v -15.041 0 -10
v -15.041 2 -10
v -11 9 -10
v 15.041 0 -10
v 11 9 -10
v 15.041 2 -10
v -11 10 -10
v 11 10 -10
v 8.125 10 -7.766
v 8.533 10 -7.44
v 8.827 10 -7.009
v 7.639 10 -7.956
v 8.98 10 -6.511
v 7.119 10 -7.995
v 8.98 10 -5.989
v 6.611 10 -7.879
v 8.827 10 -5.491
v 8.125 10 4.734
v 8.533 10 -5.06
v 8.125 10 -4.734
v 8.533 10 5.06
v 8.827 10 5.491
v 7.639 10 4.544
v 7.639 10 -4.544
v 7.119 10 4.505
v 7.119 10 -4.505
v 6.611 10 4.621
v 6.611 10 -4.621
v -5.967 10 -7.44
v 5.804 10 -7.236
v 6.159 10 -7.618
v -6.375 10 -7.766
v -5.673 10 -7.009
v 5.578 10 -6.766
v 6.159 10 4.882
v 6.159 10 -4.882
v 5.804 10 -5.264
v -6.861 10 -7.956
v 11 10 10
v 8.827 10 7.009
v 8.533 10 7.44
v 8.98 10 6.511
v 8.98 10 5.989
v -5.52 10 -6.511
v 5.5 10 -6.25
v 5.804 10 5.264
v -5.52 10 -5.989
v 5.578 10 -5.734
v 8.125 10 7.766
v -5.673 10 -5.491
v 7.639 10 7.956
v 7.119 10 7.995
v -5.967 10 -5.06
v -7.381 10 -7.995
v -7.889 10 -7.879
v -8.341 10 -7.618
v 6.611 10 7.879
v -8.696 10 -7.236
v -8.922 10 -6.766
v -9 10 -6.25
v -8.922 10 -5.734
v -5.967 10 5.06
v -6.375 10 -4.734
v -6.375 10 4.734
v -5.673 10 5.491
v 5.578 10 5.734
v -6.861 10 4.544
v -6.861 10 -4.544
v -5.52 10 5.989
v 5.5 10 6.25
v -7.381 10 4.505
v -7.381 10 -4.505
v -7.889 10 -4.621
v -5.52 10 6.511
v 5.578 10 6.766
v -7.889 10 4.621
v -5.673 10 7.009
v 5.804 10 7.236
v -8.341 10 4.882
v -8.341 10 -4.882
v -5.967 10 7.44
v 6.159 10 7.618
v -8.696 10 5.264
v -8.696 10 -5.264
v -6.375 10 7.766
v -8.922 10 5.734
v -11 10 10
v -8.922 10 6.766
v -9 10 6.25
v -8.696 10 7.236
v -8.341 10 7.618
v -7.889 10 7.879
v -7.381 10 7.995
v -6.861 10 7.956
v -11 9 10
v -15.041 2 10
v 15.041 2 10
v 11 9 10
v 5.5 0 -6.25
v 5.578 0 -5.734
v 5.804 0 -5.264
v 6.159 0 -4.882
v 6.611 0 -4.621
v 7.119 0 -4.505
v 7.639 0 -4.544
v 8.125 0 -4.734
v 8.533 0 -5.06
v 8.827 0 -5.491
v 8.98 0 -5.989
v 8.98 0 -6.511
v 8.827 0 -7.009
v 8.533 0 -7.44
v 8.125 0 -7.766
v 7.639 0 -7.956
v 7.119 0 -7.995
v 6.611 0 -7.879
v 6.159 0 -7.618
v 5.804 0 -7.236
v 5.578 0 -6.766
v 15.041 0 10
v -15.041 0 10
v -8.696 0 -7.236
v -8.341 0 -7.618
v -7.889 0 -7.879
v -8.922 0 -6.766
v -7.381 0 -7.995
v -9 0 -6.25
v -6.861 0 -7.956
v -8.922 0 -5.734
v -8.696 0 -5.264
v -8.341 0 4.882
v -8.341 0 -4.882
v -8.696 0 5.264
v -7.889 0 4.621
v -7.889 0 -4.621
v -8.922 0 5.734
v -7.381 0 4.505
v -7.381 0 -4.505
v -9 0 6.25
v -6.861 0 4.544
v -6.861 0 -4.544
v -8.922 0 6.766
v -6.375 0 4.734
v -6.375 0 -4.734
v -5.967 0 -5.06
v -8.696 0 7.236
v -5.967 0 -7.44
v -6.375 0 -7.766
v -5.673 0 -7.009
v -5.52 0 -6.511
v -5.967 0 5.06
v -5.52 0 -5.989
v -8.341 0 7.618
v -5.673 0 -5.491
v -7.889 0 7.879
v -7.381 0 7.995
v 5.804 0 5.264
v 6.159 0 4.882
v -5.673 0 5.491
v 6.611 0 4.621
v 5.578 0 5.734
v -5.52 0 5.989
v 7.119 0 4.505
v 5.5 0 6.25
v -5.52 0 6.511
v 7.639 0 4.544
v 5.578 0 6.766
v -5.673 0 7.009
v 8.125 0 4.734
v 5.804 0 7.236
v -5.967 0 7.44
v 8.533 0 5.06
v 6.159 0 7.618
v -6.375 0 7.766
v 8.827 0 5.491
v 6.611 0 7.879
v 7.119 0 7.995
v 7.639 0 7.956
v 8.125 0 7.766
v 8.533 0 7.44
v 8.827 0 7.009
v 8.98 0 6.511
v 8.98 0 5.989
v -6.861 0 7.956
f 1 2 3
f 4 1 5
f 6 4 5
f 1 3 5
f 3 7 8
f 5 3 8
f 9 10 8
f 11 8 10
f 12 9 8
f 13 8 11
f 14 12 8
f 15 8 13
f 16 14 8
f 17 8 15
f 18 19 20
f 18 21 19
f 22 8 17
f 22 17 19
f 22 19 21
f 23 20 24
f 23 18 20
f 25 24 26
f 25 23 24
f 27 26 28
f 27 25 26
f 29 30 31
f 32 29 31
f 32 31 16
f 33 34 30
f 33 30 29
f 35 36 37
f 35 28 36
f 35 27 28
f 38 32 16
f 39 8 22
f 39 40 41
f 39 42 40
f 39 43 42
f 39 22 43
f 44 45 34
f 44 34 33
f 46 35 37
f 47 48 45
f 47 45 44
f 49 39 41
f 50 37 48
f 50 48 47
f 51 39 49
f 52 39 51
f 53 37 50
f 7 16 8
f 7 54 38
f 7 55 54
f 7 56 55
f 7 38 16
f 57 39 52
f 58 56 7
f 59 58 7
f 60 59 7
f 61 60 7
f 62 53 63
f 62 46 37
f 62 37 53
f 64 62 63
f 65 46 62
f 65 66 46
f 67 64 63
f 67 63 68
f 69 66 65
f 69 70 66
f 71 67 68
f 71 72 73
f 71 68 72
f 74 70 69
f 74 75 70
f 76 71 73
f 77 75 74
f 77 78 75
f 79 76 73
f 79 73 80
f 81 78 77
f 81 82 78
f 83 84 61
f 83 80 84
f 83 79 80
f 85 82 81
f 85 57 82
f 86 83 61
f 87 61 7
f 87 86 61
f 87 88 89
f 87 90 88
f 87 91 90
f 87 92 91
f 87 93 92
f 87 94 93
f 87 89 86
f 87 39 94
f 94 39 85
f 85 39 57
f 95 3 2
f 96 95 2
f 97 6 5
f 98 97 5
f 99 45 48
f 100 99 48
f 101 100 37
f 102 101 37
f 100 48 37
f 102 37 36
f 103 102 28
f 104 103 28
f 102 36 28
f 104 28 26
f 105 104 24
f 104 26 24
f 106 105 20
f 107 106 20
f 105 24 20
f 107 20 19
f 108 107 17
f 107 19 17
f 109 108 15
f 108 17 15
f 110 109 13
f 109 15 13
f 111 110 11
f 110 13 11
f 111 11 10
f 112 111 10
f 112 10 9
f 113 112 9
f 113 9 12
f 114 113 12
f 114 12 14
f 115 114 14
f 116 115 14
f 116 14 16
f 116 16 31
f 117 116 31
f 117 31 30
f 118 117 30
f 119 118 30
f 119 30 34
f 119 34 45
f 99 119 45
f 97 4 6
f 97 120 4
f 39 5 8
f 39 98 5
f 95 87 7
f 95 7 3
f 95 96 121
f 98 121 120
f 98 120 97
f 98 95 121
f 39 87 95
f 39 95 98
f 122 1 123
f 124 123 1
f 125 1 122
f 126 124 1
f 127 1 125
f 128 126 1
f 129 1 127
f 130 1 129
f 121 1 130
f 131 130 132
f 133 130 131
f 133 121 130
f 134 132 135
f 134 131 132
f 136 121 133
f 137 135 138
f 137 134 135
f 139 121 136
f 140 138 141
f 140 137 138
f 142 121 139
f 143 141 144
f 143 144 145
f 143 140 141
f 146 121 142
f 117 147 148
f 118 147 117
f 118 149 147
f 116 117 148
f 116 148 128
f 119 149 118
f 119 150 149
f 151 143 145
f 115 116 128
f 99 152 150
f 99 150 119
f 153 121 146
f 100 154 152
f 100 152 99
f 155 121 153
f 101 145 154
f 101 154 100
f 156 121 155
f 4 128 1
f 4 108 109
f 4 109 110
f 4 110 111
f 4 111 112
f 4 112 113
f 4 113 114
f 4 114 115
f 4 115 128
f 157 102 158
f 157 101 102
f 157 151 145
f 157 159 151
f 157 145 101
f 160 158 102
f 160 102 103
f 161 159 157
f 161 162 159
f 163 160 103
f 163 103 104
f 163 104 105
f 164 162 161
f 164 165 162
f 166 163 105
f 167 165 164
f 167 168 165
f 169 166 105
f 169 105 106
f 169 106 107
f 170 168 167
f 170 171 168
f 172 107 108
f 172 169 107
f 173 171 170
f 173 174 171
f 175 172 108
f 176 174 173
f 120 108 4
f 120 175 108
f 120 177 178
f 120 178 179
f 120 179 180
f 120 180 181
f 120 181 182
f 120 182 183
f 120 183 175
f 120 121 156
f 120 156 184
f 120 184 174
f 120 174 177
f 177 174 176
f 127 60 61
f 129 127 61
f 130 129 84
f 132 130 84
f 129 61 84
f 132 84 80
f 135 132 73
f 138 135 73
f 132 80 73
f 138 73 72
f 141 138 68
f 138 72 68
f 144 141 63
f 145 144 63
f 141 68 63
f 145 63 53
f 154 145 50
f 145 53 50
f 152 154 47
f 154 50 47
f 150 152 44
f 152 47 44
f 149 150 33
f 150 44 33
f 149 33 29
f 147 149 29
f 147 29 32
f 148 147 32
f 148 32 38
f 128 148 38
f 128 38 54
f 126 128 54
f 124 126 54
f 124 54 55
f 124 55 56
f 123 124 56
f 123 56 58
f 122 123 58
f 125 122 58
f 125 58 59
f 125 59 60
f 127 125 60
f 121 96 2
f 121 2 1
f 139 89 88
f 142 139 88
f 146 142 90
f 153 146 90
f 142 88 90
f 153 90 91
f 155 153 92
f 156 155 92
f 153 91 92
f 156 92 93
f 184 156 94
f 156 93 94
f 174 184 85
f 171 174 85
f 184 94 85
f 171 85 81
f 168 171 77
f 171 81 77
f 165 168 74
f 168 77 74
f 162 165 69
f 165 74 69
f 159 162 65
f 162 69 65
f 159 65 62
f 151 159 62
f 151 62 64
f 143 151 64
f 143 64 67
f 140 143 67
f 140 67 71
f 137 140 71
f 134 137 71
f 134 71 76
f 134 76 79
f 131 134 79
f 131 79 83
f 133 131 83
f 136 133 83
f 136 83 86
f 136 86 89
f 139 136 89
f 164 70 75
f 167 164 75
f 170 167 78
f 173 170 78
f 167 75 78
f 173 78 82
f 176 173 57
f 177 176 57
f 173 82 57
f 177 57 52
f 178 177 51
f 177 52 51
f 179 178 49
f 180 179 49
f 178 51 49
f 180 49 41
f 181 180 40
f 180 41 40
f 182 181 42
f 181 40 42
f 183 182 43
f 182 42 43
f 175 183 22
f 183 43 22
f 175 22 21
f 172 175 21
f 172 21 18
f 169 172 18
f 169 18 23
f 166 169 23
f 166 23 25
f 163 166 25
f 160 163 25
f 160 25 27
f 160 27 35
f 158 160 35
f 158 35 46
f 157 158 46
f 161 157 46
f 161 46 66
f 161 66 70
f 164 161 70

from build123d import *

# Parameters (mm, degrees)
ESTRUSIONE_ESTRUSIONE1_DEPTH = 10
SCHIZZO2_R                   = 1.75
TAGLIO_ESTRUSIONE1_DEPTH     = 21.645708387


with BuildPart() as part:
    # Schizzo1 → Estrusione-Estrusione1 (new, symmetric)
    with BuildSketch(Plane.XY):
        Polygon((11, 9), (11, 10), (-11, 10), (-11, 9), (-15.041451884, 2), (-15.041451884, 0), (15.041451884, 0), (15.041451884, 2), align=None)
    extrude(amount=ESTRUSIONE_ESTRUSIONE1_DEPTH, both=True)

    # Schizzo2 → Taglio-Estrusione1 (cut, through all)
    with BuildSketch(Plane(origin=(0, 10, 0), x_dir=(1, 0, 0), z_dir=(0, 1, 0))):
        with Locations(Location((7.25, 6.25, 0), (0, 0, 180))):
            Circle(SCHIZZO2_R)
        with Locations(Location((-7.25, 6.25, 0), (0, 0, 180))):
            Circle(SCHIZZO2_R)
        with Locations(Location((-7.25, -6.25, 0), (0, 0, 180))):
            Circle(SCHIZZO2_R)
        with Locations(Location((7.25, -6.25, 0), (0, 0, 180))):
            Circle(SCHIZZO2_R)
    extrude(amount=-TAGLIO_ESTRUSIONE1_DEPTH, mode=Mode.SUBTRACT)


solid = part.part
